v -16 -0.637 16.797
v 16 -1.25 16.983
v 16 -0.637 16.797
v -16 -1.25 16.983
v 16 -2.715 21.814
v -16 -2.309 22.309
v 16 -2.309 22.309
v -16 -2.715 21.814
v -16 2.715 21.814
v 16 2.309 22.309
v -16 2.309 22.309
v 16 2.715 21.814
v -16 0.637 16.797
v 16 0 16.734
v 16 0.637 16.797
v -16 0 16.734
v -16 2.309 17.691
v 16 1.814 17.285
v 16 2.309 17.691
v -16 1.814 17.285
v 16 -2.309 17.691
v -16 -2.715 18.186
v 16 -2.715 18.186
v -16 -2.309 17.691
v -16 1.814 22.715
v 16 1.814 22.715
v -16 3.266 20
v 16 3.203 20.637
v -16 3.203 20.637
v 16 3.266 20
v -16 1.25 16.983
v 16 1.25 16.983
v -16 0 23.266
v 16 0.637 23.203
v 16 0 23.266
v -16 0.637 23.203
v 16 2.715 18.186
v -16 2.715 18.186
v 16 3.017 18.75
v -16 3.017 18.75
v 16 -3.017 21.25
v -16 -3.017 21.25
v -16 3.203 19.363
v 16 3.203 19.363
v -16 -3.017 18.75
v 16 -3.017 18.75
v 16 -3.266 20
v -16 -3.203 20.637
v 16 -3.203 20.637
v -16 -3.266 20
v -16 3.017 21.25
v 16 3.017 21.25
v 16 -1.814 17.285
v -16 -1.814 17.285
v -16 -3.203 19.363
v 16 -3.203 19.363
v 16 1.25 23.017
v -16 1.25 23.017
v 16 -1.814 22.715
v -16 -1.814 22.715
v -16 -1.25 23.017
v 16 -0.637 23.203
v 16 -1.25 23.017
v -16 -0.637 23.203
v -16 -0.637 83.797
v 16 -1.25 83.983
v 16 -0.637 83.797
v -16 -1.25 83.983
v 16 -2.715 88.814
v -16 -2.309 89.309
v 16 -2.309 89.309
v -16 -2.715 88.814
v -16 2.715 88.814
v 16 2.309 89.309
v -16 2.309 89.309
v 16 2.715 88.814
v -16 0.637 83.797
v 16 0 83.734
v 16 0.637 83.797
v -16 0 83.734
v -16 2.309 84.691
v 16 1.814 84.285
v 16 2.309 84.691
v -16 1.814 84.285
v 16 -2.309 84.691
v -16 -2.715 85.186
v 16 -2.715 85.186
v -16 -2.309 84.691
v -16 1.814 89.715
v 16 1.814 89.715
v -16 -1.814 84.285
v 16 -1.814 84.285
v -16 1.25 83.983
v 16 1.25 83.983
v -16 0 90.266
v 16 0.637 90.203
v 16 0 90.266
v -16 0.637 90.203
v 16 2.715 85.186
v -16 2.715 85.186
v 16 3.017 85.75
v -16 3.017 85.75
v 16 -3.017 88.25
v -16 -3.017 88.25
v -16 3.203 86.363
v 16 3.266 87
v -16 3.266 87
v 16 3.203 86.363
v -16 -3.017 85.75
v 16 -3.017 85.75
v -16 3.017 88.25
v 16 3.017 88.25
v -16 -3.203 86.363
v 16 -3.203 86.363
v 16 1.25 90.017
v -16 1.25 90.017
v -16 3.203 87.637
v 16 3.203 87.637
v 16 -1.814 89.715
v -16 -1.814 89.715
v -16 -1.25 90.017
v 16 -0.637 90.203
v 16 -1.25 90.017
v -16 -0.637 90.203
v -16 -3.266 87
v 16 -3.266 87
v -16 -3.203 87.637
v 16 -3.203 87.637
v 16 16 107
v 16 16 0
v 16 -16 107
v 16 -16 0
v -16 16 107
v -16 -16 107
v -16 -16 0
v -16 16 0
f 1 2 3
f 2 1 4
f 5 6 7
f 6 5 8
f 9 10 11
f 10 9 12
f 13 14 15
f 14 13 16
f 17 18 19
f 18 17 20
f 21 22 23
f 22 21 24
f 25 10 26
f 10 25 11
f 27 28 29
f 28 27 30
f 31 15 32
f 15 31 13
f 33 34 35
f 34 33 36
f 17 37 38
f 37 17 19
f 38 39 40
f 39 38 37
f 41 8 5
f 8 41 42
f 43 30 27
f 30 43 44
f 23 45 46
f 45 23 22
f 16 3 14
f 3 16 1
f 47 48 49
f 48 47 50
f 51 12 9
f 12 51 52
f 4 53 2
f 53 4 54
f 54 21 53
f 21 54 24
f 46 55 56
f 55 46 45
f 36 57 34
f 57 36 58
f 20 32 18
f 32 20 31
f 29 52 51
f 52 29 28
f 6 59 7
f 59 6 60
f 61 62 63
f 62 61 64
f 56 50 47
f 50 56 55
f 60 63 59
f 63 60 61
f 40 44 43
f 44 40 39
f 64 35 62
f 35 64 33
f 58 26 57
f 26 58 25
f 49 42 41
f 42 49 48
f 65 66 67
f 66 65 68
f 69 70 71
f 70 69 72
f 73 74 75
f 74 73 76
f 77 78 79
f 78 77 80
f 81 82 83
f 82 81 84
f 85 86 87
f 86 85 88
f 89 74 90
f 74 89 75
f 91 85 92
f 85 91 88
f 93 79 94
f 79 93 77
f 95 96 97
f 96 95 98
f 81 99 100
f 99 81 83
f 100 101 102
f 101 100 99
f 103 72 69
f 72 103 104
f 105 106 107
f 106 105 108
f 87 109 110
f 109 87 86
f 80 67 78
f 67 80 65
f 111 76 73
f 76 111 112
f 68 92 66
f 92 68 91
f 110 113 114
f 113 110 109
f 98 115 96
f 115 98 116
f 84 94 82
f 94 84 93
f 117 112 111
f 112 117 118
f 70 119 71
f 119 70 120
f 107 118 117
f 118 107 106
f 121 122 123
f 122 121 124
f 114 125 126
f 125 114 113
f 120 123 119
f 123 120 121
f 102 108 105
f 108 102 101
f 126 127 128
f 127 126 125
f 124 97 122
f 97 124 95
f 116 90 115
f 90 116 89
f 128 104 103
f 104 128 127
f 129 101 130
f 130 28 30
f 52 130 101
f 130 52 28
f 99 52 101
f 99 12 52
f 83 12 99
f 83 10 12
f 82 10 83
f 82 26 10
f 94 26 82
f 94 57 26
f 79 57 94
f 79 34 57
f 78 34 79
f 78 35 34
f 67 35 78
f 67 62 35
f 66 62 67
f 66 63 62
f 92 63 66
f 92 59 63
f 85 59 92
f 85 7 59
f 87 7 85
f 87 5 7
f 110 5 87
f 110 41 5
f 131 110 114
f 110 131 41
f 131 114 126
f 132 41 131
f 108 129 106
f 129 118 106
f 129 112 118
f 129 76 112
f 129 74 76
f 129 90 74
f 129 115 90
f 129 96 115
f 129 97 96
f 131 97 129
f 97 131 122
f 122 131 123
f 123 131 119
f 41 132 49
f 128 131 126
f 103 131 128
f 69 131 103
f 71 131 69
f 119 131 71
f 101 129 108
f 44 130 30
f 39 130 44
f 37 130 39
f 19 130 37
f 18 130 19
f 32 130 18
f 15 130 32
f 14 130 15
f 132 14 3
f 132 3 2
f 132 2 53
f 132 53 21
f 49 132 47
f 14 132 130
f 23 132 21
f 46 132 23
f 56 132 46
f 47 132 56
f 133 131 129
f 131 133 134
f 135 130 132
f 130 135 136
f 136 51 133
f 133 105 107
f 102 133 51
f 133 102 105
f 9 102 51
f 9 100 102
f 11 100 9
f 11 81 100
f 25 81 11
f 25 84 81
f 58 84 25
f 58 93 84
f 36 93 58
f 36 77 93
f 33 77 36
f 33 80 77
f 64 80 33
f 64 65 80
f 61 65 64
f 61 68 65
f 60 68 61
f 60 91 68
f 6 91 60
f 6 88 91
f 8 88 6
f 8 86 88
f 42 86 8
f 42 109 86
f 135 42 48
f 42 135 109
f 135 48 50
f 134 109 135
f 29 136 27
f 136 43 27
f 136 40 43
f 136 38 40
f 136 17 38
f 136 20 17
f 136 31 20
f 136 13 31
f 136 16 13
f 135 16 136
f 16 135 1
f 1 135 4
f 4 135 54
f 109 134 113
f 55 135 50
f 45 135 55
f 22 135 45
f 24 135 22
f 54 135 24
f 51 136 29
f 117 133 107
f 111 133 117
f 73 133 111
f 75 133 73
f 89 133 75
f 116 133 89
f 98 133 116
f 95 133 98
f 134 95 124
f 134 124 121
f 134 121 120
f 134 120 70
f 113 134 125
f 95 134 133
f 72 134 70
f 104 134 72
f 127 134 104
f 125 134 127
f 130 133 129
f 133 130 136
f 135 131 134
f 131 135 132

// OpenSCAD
// file: ../../../../../scad/lib/parent_spar_bolted.scad
// Parent modular exterior v2. mm. Geometry shared by individual part wrappers.
// Metal fasteners, ballast, Takachi box and electronics are purchased items.
/* [Dimensions] */
disk_d=225; disk_t=5;
fin_h=125; fin_w=65; fin_t=4;
beam_w=32; clearance=0.5;
float_r=100; flange_r=112.5; float_bore_r=30;
float_wall=4; float_h=180; lid_t=6;
rod_r=105.5; flange_t=6;
hub_h=32; root_x=30; root_depth=14;
$fn=96; e=0.03;
assert(disk_d<=225 && 2*flange_r<=225);
assert(fin_h>=100 && fin_h<=150 && fin_w>=50 && fin_w<=80);
assert(root_x+fin_w<disk_d/2-5);
module bore(d,h) { cylinder(d=d/cos(180/32),h=h,$fn=32); }
module bore_x(d,l) { rotate([0,90,0]) bore(d,l); }
module bore_y(d,l) { rotate([-90,0,0]) bore(d,l); }
module square_bore(h) { translate([-(beam_w+clearance)/2,-(beam_w+clearance)/2,-e]) cube([beam_w+clearance,beam_w+clearance,h+2*e]); }
module rods(h,d=6.5) { for(a=[45:90:315]) rotate([0,0,a]) translate([rod_r,0,-e]) bore(d,h+2*e); }
module lid_bolts(h) { for(a=[22.5:45:359]) rotate([0,0,a]) translate([rod_r,0,-e]) bore(4.5,h+2*e); }
module hub_pin(z) { translate([-46,10,z]) bore_x(6.5,92); }
module disk() {
 difference() { cylinder(d=disk_d,h=disk_t); square_bore(disk_t);
  for(x=[-23,23],y=[-23,23]) translate([x,y,-e]) bore(5.5,disk_t+2*e);
 }
}
module fin() {
 difference() { cube([fin_w,fin_t,fin_h]);
  for(z=[10,fin_h-hub_h+10]) translate([root_depth/2,-e,z]) bore_y(5.5,fin_t+2*e);
 }
}
module hub() {
 difference() {
  union() { translate([-30,-30,0]) cube([60,60,hub_h]);
   for(a=[0:90:270]) rotate([0,0,a]) translate([28,-16,0]) cube([16,32,hub_h]);
  }
  square_bore(hub_h);
  for(a=[0:90:270]) rotate([0,0,a]) {
   translate([root_x-clearance/2,-(fin_t+clearance)/2,-e]) cube([root_depth+clearance,fin_t+clearance,hub_h+2*e]);
   translate([root_x+root_depth/2,-17,10]) bore_y(5.5,34);
  }
  for(x=[-23,23],y=[-23,23]) translate([x,y,-e]) bore(5.5,hub_h+2*e);
  hub_pin(24);
 }
}
module beam(lower=true) {
 len=lower?180:107;
 difference() { translate([-beam_w/2,-beam_w/2,0]) cube([beam_w,beam_w,len]);
  if(lower) { for(z=[24,117]) hub_pin(z); translate([-20,0,160]) bore_x(6.5,40); translate([0,0,-e]) bore(16,8); }
  else for(z=[20,87]) translate([-20,0,z]) bore_x(6.5,40);
 }
}
module coupler() {
 // One half of a screwed split coupler. Mirror Y for the second half.
 difference() { translate([-27,0.25,0]) cube([54,26.75,64]); square_bore(64);
  for(z=[12,52]) translate([-28,0,z]) bore_x(6.5,56);
  for(x=[-22,22],z=[24,40]) translate([x,-1,z]) bore_y(5.5,29);
 }
}
module float_body() {
 difference() {
  union() { cylinder(r=float_r,h=float_h);
   translate([0,0,float_h-flange_t]) cylinder(r=flange_r,h=flange_t);
   // 45-degree underside of the flange instead of a 15 mm unsupported ledge.
   translate([0,0,float_h-flange_t-(flange_r-float_r)]) cylinder(r1=float_r,r2=flange_r,h=flange_r-float_r);
  }
  translate([0,0,-e]) cylinder(r=float_bore_r,h=float_h+2*e);
  translate([0,0,float_wall]) difference() {
   cylinder(r=float_r-float_wall,h=float_h);
   cylinder(r=float_bore_r+float_wall,h=float_h+e);
  }
  // Coupling-nut clearance; nearest cavity wall remains >=3 mm thick.
  rods(float_h,13); lid_bolts(float_h);
  for(a=[22.5:45:359]) rotate([0,0,a]) translate([rod_r,0,-e]) bore(10,float_h-flange_t+e);
 }
}
module float_lid() {
 difference() {
  cylinder(r=flange_r,h=lid_t);
  translate([0,0,-e]) cylinder(r=float_bore_r,h=lid_t+2*e);
  rods(lid_t,13); lid_bolts(lid_t);
  // Continuous face seals: 2 mm cord, 2.4 wide x 1.5 deep grooves.
  for(r=[float_bore_r+float_wall/2,float_r-float_wall/2]) translate([0,0,-e]) difference() {
   cylinder(r=r+1.2,h=1.5+e); cylinder(r=r-1.2,h=1.5+2*e);
  }
 }
}
module float_end(top=true) {
 difference() {
  union() { cylinder(r=flange_r,h=8);
   if(top) translate([-30,-30,8-e]) cube([60,60,20+e]);
   else translate([-23,-23,-40]) cube([46,46,40+e]);
  }
  rods(8);
  if(top) for(x=[-20,20],y=[-20,20]) {
   translate([x,y,-e]) bore(5.5,29);
   translate([x,y,-e]) bore(11,18+e);
  }
  if(top) for(a=[22.5:45:359]) rotate([0,0,a]) translate([rod_r,0,-e]) bore(12,8+2*e);
  else { translate([0,0,-40]) square_bore(40-e);
   translate([-24,0,-20]) bore_x(6.5,48);
  }
 }
}
module ballast_body() {
 // Open upward in print orientation. In the assembly this cup is inverted.
 difference() {
  union() { cylinder(r=45,h=51); translate([0,0,45]) cylinder(r=60,h=6);
   translate([0,0,30]) cylinder(r1=45,r2=60,h=15);
  }
  translate([0,0,6]) cylinder(r=40,h=46);
  for(x=[-23,23],y=[-23,23]) translate([x,y,-e]) bore(5.5,7);
  translate([0,0,-e]) bore(8.5,7);
  for(a=[0:90:270]) rotate([0,0,a]) translate([52,0,29]) { bore(5.5,23); bore(12,16); }
 }
}
module ballast_lid() {
 difference() { cylinder(r=60,h=6);
  for(a=[0:90:270]) rotate([0,0,a]) translate([52,0,-e]) bore(5.5,7);
  // Flooded ballast compartment: drainage, no trapped air assumption.
  for(x=[-20,0,20]) translate([x,0,-e]) bore(6,7);
 }
}
module camera_bridge() {
 // Assembly frame: local top z=78; camera seat z=8. +Y faces camera front.
 difference() {
  union() {
   translate([-30,45,70]) cube([60,90,8]);
   translate([-70,125,0]) cube([140,100,8]);
   translate([-70,125,0]) cube([140,10,78]);
   for(x=[-64,56]) translate([x,0,0]) rotate([90,0,90]) linear_extrude(8)
    polygon([[135,8],[215,8],[135,70]]);
  }
  for(x=[-20,20],y=[50,90]) translate([x,y,69]) bore(5.5,10);
  for(x=[-11,11],y=[174,206]) translate([x,y,-e]) bore(5.5,10);
 }
}
module gps_bridge() {
 // Local attachment face X=0 at deck +X; top shelf z=175.
 difference() {
  union() { translate([0,-25,0]) cube([10,50,183]);
   translate([-90,-48,175]) cube([100,96,8]);
   for(y=[-17,25]) translate([0,y,0]) rotate([90,0,0]) linear_extrude(8)
    polygon([[e,155],[e,175+e],[-80,175+e]]);
  }
  for(y=[-20,20],z=[5,45]) translate([-e,y,z]) bore_x(5.5,11);
  for(y=[-34,34]) translate([-43,y,174]) bore(4.5,10);
 }
}
// Reference antenna envelope, correct mounting ears, not a printable antenna.
module gps_reference() {
 difference() {
  union() { translate([-30,-28,0]) cube([60,56,22.5]);
   translate([-10,-41,0]) cube([20,82,6]); }
  for(y=[-34,34]) translate([0,y,-e]) bore(4.5,7);
 }
}
// main file
// mm. part=print is the intended X1C orientation.
part="assembly"; // [assembly,print]
use <../../../../../scad/lib/parent_spar_bolted.scad>
if(part=="print") { translate([0,0,16]) rotate([0,90,0]) beam(false); } else { beam(false); }
